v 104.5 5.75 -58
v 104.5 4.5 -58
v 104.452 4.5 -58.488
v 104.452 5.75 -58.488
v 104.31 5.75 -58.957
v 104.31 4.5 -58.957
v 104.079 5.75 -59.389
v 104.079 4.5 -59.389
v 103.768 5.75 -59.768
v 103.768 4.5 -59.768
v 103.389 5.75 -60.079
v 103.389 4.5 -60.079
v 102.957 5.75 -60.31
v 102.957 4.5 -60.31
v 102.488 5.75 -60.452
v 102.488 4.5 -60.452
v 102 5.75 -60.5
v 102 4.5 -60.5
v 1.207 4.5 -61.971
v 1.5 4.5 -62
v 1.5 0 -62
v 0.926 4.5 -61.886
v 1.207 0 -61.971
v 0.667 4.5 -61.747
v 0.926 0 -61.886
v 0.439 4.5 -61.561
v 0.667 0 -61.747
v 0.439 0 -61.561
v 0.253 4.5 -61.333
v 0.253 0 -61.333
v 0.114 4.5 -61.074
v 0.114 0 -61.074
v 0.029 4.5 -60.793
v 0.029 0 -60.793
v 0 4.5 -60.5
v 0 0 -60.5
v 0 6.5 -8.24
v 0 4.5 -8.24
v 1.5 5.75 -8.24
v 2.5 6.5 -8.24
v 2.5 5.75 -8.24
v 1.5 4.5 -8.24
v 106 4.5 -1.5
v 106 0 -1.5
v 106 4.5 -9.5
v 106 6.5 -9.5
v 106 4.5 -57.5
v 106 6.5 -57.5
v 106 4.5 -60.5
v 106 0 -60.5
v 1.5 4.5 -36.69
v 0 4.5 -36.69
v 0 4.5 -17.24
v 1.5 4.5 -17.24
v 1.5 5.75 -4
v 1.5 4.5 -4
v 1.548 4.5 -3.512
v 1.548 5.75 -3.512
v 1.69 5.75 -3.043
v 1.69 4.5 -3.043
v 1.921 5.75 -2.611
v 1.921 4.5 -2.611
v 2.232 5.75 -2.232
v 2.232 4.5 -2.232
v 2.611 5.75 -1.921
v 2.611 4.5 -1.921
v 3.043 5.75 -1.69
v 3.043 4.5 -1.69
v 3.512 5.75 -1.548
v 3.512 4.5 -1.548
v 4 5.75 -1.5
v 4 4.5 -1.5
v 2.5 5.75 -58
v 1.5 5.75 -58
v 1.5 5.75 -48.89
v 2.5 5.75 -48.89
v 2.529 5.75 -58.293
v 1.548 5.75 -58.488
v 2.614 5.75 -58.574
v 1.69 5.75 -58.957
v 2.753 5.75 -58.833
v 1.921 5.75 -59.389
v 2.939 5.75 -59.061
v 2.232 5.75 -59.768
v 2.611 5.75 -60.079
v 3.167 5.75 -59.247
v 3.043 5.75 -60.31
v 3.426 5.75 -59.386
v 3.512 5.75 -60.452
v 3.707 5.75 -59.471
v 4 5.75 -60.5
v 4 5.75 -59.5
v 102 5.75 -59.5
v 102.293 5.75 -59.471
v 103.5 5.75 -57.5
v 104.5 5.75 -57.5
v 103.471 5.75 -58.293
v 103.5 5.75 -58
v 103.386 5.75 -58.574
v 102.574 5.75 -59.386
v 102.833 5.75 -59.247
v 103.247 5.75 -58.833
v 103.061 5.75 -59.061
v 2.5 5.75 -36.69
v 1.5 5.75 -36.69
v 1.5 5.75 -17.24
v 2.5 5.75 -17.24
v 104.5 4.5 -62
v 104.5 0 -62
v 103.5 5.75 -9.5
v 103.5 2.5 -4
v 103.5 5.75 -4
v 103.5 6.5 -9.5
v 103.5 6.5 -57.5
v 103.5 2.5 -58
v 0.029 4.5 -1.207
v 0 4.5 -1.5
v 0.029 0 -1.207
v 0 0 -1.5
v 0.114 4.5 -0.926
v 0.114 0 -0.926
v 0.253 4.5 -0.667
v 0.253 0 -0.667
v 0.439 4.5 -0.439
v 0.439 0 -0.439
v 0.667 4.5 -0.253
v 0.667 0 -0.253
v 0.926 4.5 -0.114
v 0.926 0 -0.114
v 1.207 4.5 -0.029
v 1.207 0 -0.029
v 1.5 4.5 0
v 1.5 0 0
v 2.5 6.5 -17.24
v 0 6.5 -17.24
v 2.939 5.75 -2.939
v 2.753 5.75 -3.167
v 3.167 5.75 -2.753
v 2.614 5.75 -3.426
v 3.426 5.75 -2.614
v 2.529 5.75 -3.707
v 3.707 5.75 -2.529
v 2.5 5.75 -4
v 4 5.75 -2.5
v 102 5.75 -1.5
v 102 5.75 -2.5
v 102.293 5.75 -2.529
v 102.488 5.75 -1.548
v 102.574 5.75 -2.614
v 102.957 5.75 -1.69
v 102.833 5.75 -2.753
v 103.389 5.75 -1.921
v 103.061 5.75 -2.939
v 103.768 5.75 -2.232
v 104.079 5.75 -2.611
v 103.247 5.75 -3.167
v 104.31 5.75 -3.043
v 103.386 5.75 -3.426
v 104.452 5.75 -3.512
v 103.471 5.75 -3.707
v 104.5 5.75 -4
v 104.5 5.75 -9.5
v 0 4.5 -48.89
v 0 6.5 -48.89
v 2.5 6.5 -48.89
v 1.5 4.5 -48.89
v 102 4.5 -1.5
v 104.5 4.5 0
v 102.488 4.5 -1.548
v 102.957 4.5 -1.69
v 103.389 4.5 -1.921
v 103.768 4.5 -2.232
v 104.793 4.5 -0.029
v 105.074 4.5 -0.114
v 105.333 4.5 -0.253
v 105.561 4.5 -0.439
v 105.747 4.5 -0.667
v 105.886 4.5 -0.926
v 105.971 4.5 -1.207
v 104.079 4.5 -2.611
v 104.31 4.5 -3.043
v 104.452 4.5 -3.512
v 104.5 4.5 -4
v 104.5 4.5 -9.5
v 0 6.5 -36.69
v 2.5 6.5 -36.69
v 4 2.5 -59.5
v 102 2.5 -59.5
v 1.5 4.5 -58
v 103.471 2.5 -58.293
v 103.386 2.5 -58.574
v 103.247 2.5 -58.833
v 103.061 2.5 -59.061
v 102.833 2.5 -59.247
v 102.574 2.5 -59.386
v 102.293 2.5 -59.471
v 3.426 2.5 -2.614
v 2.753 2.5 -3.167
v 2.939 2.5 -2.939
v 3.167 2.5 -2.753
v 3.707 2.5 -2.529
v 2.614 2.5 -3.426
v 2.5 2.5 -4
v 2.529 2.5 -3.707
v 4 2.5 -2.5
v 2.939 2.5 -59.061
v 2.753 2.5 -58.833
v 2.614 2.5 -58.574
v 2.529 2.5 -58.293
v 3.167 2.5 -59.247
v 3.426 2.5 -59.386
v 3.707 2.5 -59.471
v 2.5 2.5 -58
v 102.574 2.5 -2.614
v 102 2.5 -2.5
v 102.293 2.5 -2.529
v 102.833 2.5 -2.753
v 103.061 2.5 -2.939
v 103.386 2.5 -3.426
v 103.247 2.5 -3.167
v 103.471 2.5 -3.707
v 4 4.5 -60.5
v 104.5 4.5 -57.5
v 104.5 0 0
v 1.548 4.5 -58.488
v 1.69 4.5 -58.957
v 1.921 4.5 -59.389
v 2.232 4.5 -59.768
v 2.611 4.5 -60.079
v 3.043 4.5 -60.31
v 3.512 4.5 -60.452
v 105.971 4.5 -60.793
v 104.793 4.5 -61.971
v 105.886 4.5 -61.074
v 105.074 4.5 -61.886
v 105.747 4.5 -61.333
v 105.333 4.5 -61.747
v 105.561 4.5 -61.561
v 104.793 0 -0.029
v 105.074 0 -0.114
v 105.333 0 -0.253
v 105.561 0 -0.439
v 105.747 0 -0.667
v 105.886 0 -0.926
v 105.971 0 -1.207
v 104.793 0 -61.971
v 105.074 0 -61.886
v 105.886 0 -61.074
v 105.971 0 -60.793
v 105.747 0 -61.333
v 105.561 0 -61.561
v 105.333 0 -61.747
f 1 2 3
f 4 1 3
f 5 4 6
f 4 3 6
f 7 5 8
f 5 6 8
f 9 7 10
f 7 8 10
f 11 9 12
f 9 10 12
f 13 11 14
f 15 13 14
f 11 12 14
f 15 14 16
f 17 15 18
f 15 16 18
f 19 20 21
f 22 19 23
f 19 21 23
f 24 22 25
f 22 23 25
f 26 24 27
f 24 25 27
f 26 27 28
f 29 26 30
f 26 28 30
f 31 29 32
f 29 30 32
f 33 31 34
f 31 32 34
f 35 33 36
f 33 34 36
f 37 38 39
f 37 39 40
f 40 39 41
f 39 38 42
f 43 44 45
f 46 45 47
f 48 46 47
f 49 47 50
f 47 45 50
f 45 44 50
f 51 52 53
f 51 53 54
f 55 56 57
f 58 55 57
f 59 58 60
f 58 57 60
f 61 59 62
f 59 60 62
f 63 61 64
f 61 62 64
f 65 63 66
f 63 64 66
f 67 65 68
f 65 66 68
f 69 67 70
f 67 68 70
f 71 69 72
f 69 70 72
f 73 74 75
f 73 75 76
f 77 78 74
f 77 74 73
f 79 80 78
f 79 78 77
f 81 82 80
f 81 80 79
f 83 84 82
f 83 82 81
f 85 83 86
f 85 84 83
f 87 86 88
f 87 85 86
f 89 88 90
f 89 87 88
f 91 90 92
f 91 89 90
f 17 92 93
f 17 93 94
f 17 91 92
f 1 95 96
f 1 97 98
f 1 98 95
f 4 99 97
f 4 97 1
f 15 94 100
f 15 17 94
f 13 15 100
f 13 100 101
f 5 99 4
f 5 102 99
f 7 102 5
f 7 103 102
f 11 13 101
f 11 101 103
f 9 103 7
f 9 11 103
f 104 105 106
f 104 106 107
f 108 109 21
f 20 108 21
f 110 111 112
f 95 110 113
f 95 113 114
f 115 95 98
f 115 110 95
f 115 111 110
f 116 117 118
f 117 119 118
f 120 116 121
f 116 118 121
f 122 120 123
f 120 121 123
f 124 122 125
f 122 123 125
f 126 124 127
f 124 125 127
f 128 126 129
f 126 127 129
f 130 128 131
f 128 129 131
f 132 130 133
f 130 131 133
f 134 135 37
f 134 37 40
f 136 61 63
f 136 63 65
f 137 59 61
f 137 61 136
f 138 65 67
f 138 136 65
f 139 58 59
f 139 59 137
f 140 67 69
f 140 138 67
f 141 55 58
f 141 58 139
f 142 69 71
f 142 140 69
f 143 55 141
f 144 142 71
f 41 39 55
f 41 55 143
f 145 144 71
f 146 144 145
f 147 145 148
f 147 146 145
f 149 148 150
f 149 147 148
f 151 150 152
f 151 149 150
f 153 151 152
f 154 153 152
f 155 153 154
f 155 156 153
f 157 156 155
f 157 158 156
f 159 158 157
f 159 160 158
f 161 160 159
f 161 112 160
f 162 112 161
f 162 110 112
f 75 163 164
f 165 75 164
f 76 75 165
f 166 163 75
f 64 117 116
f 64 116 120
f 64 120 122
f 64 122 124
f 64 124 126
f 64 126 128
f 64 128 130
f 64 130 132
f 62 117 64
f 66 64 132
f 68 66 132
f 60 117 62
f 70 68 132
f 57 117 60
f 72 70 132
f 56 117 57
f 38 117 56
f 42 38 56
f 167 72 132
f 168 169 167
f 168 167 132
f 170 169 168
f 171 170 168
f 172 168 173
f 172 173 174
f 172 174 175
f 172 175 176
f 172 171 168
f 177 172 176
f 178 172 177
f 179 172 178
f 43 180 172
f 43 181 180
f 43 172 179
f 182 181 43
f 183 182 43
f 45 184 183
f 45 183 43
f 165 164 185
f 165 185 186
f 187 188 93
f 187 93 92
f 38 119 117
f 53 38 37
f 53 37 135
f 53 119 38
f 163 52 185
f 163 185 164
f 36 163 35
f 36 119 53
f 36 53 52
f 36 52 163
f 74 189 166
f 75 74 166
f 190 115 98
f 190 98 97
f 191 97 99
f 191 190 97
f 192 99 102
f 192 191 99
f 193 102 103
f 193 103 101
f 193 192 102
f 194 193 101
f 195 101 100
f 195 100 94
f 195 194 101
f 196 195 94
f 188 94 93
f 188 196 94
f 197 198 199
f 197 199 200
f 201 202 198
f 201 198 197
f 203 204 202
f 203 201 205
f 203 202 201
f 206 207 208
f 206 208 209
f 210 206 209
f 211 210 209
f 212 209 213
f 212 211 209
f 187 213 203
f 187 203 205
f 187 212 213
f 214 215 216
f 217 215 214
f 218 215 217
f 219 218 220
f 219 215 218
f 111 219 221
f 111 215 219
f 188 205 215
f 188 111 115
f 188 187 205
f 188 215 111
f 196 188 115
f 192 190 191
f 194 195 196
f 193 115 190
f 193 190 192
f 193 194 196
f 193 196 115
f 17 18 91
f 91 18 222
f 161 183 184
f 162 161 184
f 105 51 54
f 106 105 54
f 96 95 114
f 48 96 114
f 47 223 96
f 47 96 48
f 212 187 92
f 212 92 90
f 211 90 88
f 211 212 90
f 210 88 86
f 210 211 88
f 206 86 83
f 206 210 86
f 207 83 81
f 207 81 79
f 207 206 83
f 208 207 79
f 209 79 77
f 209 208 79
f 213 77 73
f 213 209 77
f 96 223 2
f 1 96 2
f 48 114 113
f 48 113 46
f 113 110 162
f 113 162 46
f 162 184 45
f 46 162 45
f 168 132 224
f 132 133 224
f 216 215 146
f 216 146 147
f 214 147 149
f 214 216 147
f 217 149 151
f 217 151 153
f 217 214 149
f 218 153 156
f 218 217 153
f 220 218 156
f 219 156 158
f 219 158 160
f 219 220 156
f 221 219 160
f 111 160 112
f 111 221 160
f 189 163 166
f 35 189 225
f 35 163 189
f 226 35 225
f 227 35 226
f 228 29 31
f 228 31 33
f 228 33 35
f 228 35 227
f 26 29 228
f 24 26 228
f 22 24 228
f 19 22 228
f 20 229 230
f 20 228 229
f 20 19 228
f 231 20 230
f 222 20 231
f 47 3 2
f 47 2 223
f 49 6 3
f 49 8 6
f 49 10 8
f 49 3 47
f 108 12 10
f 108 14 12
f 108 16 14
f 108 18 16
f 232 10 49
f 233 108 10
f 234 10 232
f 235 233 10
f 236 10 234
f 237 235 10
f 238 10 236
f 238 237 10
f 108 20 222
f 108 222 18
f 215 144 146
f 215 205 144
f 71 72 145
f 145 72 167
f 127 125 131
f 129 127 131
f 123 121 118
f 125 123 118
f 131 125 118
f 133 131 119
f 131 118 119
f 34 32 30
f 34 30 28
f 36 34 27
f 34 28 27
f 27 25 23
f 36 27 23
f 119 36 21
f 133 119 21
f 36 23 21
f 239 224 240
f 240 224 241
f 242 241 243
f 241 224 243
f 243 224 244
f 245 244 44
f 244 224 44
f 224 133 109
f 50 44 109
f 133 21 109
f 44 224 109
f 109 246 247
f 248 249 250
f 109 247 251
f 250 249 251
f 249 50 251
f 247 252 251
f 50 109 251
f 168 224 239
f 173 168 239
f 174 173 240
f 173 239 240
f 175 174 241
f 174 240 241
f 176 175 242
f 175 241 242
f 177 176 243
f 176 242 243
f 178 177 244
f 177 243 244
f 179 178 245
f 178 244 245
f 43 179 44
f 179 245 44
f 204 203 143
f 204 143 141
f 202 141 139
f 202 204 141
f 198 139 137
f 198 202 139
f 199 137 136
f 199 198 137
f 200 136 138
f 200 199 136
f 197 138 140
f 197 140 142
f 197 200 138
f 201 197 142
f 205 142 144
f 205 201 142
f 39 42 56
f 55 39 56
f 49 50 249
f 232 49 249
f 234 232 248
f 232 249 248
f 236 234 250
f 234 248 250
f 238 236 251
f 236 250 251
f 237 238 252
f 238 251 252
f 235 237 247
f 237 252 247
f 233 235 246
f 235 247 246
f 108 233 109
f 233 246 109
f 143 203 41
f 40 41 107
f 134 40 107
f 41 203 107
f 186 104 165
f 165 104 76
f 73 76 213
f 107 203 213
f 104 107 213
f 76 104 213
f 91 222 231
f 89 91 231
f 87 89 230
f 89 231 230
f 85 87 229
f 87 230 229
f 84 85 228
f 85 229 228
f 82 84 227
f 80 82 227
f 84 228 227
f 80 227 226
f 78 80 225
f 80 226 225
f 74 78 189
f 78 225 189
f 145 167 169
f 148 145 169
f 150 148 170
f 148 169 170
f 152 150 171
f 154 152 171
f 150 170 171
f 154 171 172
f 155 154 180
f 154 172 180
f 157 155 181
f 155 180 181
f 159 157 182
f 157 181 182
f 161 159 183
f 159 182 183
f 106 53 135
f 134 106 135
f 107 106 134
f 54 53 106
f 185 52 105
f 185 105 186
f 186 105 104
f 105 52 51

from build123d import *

# Parameters (mm, degrees)
SKETCH1_W           = 106
SKETCH1_H           = 62
BOSS_EXTRUDE1_DEPTH = 2.5
FILLET1_R           = 1.5
BOSS_EXTRUDE2_DEPTH = 2
BOSS_EXTRUDE3_DEPTH = 1.25
SKETCH4_W           = 2.5
SKETCH4_H           = 9
SKETCH4_H_2         = 12.2
SKETCH4_H_3         = 48
BOSS_EXTRUDE4_DEPTH = 2


with BuildPart() as part:
    # Sketch1 → Boss-Extrude1 (new body)
    with BuildSketch(Plane(origin=(0, 0, 0), x_dir=(1, 0, 0), z_dir=(0, 1, 0))):
        with Locations((53, 31)):
            Rectangle(SKETCH1_W, SKETCH1_H)
    extrude(amount=BOSS_EXTRUDE1_DEPTH)

    # Fillet1
    fillet1_edges = [part.edges().sort_by_distance(p)[0] for p in [
        (0, 1.25, 0),
        (0, 1.25, -62),
        (106, 1.25, -62),
        (106, 1.25, 0),
    ]]
    fillet(fillet1_edges, radius=FILLET1_R)

    # Sketch2 → Boss-Extrude2 (add)
    with BuildSketch(Plane(origin=(0, 2.5, 0), x_dir=(1, 0, 0), z_dir=(0, 1, 0))):
        with BuildLine():
            Line((104.5, 62), (1.5, 62))
            ThreePointArc((1.5, 62), (0.439339828, 61.560660172), (0, 60.5))
            Line((0, 60.5), (0, 1.5))
            ThreePointArc((0, 1.5), (0.439339828, 0.439339828), (1.5, 0))
            Line((1.5, 0), (104.5, 0))
            ThreePointArc((104.5, 0), (105.560660172, 0.439339828), (106, 1.5))
            Line((106, 1.5), (106, 60.5))
            ThreePointArc((106, 60.5), (105.560660172, 61.560660172), (104.5, 62))
        make_face()
        with BuildLine():
            Line((102, 59.5), (4, 59.5))
            ThreePointArc((4, 59.5), (2.939339828, 59.060660172), (2.5, 58))
            Line((2.5, 58), (2.5, 4))
            ThreePointArc((2.5, 4), (2.939339828, 2.939339828), (4, 2.5))
            Line((4, 2.5), (102, 2.5))
            ThreePointArc((102, 2.5), (103.060660172, 2.939339828), (103.5, 4))
            Line((103.5, 4), (103.5, 58))
            ThreePointArc((103.5, 58), (103.060660172, 59.060660172), (102, 59.5))
        make_face(mode=Mode.SUBTRACT)
    extrude(amount=BOSS_EXTRUDE2_DEPTH)

    # Sketch3 → Boss-Extrude3 (add)
    with BuildSketch(Plane(origin=(0, 4.5, 0), x_dir=(1, 0, 0), z_dir=(0, 1, 0))):
        with BuildLine():
            Line((4, 1.5), (102, 1.5))
            ThreePointArc((102, 1.5), (103.767766953, 2.232233047), (104.5, 4))
            Line((104.5, 4), (104.5, 58))
            ThreePointArc((104.5, 58), (103.767766953, 59.767766953), (102, 60.5))
            Line((102, 60.5), (4, 60.5))
            ThreePointArc((4, 60.5), (2.232233047, 59.767766953), (1.5, 58))
            Line((1.5, 58), (1.5, 4))
            ThreePointArc((1.5, 4), (2.232233047, 2.232233047), (4, 1.5))
        make_face()
        with BuildLine():
            Line((4, 2.5), (102, 2.5))
            ThreePointArc((102, 2.5), (103.060660172, 2.939339828), (103.5, 4))
            Line((103.5, 4), (103.5, 58))
            ThreePointArc((103.5, 58), (103.060660172, 59.060660172), (102, 59.5))
            Line((102, 59.5), (4, 59.5))
            ThreePointArc((4, 59.5), (2.939339828, 59.060660172), (2.5, 58))
            Line((2.5, 58), (2.5, 4))
            ThreePointArc((2.5, 4), (2.939339828, 2.939339828), (4, 2.5))
        make_face(mode=Mode.SUBTRACT)
    extrude(amount=BOSS_EXTRUDE3_DEPTH)

    # Sketch4 → Boss-Extrude4 (add)
    with BuildSketch(Plane(origin=(0, 4.5, 0), x_dir=(1, 0, 0), z_dir=(0, 1, 0))):
        with Locations((1.25, 12.74)):
            Rectangle(SKETCH4_W, SKETCH4_H)
        with Locations((1.25, 42.79)):
            Rectangle(SKETCH4_W, SKETCH4_H_2)
        with Locations((104.75, 33.5)):
            Rectangle(SKETCH4_W, SKETCH4_H_3)
    extrude(amount=BOSS_EXTRUDE4_DEPTH)


solid = part.part
